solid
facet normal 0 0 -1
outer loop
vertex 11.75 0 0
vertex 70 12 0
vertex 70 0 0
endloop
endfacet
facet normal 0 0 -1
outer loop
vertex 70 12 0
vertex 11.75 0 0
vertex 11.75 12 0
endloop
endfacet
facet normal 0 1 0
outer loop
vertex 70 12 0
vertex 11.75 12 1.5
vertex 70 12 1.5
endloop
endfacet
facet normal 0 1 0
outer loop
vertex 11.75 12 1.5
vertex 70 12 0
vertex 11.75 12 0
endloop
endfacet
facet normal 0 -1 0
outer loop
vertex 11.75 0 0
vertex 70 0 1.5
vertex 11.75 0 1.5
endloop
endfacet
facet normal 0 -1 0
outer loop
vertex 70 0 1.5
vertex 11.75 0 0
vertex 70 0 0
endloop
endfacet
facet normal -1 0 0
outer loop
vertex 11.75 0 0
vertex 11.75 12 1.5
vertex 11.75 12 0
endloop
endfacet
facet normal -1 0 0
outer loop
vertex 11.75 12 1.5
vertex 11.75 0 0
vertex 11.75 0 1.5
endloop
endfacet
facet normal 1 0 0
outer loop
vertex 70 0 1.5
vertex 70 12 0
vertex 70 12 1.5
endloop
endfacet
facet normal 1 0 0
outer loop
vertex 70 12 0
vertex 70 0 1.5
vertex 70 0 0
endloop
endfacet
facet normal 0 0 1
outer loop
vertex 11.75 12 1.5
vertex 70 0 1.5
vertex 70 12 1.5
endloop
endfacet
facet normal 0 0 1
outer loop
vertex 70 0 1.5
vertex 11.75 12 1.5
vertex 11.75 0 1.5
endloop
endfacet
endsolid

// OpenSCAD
// 10-well agarose gel comb, printed lying flat
// Units: mm

$fn = 64;

// Plate / spine
plate_len   = 70;   // spine length (X)
plate_wid   = 12;   // spine width (Y)
plate_thk   = 1.5;  // plate thickness (Z)

// Teeth
tooth_count = 10;   // number of wells
tooth_w     = 5.0;  // tooth width (X)
tooth_l     = 12;   // tooth length (Y)
tooth_pitch = 1.5;  // centre-to-centre spacing (X)

// Cut overlap
eps = 0.5;          // extension past cut faces

// Derived
row_len   = (tooth_count - 1) * tooth_pitch;  // span of 10 teeth
y0        = -plate_wid / 2 + tooth_l / 2;      // tooth base Y position

difference() {
    union() {
        // Spine
        translate([0, 0, 0])
            cube([plate_len, plate_wid, plate_thk]);

        // Teeth
        for (i = [0 : tooth_count - 1]) {
            x = -row_len / 2 + i * tooth_pitch;
            translate([x, y0, 0])
                cube([tooth_w, tooth_l, plate_thk + eps]);
        }
    }

    // Cut the well shapes (through the full thickness)
    for (i = [0 : tooth_count - 1]) {
        x = -row_len / 2 + i * tooth_pitch;
        translate([x, y0, -eps])
            cube([tooth_w, tooth_l, plate_thk + 2 * eps]);
    }
}
